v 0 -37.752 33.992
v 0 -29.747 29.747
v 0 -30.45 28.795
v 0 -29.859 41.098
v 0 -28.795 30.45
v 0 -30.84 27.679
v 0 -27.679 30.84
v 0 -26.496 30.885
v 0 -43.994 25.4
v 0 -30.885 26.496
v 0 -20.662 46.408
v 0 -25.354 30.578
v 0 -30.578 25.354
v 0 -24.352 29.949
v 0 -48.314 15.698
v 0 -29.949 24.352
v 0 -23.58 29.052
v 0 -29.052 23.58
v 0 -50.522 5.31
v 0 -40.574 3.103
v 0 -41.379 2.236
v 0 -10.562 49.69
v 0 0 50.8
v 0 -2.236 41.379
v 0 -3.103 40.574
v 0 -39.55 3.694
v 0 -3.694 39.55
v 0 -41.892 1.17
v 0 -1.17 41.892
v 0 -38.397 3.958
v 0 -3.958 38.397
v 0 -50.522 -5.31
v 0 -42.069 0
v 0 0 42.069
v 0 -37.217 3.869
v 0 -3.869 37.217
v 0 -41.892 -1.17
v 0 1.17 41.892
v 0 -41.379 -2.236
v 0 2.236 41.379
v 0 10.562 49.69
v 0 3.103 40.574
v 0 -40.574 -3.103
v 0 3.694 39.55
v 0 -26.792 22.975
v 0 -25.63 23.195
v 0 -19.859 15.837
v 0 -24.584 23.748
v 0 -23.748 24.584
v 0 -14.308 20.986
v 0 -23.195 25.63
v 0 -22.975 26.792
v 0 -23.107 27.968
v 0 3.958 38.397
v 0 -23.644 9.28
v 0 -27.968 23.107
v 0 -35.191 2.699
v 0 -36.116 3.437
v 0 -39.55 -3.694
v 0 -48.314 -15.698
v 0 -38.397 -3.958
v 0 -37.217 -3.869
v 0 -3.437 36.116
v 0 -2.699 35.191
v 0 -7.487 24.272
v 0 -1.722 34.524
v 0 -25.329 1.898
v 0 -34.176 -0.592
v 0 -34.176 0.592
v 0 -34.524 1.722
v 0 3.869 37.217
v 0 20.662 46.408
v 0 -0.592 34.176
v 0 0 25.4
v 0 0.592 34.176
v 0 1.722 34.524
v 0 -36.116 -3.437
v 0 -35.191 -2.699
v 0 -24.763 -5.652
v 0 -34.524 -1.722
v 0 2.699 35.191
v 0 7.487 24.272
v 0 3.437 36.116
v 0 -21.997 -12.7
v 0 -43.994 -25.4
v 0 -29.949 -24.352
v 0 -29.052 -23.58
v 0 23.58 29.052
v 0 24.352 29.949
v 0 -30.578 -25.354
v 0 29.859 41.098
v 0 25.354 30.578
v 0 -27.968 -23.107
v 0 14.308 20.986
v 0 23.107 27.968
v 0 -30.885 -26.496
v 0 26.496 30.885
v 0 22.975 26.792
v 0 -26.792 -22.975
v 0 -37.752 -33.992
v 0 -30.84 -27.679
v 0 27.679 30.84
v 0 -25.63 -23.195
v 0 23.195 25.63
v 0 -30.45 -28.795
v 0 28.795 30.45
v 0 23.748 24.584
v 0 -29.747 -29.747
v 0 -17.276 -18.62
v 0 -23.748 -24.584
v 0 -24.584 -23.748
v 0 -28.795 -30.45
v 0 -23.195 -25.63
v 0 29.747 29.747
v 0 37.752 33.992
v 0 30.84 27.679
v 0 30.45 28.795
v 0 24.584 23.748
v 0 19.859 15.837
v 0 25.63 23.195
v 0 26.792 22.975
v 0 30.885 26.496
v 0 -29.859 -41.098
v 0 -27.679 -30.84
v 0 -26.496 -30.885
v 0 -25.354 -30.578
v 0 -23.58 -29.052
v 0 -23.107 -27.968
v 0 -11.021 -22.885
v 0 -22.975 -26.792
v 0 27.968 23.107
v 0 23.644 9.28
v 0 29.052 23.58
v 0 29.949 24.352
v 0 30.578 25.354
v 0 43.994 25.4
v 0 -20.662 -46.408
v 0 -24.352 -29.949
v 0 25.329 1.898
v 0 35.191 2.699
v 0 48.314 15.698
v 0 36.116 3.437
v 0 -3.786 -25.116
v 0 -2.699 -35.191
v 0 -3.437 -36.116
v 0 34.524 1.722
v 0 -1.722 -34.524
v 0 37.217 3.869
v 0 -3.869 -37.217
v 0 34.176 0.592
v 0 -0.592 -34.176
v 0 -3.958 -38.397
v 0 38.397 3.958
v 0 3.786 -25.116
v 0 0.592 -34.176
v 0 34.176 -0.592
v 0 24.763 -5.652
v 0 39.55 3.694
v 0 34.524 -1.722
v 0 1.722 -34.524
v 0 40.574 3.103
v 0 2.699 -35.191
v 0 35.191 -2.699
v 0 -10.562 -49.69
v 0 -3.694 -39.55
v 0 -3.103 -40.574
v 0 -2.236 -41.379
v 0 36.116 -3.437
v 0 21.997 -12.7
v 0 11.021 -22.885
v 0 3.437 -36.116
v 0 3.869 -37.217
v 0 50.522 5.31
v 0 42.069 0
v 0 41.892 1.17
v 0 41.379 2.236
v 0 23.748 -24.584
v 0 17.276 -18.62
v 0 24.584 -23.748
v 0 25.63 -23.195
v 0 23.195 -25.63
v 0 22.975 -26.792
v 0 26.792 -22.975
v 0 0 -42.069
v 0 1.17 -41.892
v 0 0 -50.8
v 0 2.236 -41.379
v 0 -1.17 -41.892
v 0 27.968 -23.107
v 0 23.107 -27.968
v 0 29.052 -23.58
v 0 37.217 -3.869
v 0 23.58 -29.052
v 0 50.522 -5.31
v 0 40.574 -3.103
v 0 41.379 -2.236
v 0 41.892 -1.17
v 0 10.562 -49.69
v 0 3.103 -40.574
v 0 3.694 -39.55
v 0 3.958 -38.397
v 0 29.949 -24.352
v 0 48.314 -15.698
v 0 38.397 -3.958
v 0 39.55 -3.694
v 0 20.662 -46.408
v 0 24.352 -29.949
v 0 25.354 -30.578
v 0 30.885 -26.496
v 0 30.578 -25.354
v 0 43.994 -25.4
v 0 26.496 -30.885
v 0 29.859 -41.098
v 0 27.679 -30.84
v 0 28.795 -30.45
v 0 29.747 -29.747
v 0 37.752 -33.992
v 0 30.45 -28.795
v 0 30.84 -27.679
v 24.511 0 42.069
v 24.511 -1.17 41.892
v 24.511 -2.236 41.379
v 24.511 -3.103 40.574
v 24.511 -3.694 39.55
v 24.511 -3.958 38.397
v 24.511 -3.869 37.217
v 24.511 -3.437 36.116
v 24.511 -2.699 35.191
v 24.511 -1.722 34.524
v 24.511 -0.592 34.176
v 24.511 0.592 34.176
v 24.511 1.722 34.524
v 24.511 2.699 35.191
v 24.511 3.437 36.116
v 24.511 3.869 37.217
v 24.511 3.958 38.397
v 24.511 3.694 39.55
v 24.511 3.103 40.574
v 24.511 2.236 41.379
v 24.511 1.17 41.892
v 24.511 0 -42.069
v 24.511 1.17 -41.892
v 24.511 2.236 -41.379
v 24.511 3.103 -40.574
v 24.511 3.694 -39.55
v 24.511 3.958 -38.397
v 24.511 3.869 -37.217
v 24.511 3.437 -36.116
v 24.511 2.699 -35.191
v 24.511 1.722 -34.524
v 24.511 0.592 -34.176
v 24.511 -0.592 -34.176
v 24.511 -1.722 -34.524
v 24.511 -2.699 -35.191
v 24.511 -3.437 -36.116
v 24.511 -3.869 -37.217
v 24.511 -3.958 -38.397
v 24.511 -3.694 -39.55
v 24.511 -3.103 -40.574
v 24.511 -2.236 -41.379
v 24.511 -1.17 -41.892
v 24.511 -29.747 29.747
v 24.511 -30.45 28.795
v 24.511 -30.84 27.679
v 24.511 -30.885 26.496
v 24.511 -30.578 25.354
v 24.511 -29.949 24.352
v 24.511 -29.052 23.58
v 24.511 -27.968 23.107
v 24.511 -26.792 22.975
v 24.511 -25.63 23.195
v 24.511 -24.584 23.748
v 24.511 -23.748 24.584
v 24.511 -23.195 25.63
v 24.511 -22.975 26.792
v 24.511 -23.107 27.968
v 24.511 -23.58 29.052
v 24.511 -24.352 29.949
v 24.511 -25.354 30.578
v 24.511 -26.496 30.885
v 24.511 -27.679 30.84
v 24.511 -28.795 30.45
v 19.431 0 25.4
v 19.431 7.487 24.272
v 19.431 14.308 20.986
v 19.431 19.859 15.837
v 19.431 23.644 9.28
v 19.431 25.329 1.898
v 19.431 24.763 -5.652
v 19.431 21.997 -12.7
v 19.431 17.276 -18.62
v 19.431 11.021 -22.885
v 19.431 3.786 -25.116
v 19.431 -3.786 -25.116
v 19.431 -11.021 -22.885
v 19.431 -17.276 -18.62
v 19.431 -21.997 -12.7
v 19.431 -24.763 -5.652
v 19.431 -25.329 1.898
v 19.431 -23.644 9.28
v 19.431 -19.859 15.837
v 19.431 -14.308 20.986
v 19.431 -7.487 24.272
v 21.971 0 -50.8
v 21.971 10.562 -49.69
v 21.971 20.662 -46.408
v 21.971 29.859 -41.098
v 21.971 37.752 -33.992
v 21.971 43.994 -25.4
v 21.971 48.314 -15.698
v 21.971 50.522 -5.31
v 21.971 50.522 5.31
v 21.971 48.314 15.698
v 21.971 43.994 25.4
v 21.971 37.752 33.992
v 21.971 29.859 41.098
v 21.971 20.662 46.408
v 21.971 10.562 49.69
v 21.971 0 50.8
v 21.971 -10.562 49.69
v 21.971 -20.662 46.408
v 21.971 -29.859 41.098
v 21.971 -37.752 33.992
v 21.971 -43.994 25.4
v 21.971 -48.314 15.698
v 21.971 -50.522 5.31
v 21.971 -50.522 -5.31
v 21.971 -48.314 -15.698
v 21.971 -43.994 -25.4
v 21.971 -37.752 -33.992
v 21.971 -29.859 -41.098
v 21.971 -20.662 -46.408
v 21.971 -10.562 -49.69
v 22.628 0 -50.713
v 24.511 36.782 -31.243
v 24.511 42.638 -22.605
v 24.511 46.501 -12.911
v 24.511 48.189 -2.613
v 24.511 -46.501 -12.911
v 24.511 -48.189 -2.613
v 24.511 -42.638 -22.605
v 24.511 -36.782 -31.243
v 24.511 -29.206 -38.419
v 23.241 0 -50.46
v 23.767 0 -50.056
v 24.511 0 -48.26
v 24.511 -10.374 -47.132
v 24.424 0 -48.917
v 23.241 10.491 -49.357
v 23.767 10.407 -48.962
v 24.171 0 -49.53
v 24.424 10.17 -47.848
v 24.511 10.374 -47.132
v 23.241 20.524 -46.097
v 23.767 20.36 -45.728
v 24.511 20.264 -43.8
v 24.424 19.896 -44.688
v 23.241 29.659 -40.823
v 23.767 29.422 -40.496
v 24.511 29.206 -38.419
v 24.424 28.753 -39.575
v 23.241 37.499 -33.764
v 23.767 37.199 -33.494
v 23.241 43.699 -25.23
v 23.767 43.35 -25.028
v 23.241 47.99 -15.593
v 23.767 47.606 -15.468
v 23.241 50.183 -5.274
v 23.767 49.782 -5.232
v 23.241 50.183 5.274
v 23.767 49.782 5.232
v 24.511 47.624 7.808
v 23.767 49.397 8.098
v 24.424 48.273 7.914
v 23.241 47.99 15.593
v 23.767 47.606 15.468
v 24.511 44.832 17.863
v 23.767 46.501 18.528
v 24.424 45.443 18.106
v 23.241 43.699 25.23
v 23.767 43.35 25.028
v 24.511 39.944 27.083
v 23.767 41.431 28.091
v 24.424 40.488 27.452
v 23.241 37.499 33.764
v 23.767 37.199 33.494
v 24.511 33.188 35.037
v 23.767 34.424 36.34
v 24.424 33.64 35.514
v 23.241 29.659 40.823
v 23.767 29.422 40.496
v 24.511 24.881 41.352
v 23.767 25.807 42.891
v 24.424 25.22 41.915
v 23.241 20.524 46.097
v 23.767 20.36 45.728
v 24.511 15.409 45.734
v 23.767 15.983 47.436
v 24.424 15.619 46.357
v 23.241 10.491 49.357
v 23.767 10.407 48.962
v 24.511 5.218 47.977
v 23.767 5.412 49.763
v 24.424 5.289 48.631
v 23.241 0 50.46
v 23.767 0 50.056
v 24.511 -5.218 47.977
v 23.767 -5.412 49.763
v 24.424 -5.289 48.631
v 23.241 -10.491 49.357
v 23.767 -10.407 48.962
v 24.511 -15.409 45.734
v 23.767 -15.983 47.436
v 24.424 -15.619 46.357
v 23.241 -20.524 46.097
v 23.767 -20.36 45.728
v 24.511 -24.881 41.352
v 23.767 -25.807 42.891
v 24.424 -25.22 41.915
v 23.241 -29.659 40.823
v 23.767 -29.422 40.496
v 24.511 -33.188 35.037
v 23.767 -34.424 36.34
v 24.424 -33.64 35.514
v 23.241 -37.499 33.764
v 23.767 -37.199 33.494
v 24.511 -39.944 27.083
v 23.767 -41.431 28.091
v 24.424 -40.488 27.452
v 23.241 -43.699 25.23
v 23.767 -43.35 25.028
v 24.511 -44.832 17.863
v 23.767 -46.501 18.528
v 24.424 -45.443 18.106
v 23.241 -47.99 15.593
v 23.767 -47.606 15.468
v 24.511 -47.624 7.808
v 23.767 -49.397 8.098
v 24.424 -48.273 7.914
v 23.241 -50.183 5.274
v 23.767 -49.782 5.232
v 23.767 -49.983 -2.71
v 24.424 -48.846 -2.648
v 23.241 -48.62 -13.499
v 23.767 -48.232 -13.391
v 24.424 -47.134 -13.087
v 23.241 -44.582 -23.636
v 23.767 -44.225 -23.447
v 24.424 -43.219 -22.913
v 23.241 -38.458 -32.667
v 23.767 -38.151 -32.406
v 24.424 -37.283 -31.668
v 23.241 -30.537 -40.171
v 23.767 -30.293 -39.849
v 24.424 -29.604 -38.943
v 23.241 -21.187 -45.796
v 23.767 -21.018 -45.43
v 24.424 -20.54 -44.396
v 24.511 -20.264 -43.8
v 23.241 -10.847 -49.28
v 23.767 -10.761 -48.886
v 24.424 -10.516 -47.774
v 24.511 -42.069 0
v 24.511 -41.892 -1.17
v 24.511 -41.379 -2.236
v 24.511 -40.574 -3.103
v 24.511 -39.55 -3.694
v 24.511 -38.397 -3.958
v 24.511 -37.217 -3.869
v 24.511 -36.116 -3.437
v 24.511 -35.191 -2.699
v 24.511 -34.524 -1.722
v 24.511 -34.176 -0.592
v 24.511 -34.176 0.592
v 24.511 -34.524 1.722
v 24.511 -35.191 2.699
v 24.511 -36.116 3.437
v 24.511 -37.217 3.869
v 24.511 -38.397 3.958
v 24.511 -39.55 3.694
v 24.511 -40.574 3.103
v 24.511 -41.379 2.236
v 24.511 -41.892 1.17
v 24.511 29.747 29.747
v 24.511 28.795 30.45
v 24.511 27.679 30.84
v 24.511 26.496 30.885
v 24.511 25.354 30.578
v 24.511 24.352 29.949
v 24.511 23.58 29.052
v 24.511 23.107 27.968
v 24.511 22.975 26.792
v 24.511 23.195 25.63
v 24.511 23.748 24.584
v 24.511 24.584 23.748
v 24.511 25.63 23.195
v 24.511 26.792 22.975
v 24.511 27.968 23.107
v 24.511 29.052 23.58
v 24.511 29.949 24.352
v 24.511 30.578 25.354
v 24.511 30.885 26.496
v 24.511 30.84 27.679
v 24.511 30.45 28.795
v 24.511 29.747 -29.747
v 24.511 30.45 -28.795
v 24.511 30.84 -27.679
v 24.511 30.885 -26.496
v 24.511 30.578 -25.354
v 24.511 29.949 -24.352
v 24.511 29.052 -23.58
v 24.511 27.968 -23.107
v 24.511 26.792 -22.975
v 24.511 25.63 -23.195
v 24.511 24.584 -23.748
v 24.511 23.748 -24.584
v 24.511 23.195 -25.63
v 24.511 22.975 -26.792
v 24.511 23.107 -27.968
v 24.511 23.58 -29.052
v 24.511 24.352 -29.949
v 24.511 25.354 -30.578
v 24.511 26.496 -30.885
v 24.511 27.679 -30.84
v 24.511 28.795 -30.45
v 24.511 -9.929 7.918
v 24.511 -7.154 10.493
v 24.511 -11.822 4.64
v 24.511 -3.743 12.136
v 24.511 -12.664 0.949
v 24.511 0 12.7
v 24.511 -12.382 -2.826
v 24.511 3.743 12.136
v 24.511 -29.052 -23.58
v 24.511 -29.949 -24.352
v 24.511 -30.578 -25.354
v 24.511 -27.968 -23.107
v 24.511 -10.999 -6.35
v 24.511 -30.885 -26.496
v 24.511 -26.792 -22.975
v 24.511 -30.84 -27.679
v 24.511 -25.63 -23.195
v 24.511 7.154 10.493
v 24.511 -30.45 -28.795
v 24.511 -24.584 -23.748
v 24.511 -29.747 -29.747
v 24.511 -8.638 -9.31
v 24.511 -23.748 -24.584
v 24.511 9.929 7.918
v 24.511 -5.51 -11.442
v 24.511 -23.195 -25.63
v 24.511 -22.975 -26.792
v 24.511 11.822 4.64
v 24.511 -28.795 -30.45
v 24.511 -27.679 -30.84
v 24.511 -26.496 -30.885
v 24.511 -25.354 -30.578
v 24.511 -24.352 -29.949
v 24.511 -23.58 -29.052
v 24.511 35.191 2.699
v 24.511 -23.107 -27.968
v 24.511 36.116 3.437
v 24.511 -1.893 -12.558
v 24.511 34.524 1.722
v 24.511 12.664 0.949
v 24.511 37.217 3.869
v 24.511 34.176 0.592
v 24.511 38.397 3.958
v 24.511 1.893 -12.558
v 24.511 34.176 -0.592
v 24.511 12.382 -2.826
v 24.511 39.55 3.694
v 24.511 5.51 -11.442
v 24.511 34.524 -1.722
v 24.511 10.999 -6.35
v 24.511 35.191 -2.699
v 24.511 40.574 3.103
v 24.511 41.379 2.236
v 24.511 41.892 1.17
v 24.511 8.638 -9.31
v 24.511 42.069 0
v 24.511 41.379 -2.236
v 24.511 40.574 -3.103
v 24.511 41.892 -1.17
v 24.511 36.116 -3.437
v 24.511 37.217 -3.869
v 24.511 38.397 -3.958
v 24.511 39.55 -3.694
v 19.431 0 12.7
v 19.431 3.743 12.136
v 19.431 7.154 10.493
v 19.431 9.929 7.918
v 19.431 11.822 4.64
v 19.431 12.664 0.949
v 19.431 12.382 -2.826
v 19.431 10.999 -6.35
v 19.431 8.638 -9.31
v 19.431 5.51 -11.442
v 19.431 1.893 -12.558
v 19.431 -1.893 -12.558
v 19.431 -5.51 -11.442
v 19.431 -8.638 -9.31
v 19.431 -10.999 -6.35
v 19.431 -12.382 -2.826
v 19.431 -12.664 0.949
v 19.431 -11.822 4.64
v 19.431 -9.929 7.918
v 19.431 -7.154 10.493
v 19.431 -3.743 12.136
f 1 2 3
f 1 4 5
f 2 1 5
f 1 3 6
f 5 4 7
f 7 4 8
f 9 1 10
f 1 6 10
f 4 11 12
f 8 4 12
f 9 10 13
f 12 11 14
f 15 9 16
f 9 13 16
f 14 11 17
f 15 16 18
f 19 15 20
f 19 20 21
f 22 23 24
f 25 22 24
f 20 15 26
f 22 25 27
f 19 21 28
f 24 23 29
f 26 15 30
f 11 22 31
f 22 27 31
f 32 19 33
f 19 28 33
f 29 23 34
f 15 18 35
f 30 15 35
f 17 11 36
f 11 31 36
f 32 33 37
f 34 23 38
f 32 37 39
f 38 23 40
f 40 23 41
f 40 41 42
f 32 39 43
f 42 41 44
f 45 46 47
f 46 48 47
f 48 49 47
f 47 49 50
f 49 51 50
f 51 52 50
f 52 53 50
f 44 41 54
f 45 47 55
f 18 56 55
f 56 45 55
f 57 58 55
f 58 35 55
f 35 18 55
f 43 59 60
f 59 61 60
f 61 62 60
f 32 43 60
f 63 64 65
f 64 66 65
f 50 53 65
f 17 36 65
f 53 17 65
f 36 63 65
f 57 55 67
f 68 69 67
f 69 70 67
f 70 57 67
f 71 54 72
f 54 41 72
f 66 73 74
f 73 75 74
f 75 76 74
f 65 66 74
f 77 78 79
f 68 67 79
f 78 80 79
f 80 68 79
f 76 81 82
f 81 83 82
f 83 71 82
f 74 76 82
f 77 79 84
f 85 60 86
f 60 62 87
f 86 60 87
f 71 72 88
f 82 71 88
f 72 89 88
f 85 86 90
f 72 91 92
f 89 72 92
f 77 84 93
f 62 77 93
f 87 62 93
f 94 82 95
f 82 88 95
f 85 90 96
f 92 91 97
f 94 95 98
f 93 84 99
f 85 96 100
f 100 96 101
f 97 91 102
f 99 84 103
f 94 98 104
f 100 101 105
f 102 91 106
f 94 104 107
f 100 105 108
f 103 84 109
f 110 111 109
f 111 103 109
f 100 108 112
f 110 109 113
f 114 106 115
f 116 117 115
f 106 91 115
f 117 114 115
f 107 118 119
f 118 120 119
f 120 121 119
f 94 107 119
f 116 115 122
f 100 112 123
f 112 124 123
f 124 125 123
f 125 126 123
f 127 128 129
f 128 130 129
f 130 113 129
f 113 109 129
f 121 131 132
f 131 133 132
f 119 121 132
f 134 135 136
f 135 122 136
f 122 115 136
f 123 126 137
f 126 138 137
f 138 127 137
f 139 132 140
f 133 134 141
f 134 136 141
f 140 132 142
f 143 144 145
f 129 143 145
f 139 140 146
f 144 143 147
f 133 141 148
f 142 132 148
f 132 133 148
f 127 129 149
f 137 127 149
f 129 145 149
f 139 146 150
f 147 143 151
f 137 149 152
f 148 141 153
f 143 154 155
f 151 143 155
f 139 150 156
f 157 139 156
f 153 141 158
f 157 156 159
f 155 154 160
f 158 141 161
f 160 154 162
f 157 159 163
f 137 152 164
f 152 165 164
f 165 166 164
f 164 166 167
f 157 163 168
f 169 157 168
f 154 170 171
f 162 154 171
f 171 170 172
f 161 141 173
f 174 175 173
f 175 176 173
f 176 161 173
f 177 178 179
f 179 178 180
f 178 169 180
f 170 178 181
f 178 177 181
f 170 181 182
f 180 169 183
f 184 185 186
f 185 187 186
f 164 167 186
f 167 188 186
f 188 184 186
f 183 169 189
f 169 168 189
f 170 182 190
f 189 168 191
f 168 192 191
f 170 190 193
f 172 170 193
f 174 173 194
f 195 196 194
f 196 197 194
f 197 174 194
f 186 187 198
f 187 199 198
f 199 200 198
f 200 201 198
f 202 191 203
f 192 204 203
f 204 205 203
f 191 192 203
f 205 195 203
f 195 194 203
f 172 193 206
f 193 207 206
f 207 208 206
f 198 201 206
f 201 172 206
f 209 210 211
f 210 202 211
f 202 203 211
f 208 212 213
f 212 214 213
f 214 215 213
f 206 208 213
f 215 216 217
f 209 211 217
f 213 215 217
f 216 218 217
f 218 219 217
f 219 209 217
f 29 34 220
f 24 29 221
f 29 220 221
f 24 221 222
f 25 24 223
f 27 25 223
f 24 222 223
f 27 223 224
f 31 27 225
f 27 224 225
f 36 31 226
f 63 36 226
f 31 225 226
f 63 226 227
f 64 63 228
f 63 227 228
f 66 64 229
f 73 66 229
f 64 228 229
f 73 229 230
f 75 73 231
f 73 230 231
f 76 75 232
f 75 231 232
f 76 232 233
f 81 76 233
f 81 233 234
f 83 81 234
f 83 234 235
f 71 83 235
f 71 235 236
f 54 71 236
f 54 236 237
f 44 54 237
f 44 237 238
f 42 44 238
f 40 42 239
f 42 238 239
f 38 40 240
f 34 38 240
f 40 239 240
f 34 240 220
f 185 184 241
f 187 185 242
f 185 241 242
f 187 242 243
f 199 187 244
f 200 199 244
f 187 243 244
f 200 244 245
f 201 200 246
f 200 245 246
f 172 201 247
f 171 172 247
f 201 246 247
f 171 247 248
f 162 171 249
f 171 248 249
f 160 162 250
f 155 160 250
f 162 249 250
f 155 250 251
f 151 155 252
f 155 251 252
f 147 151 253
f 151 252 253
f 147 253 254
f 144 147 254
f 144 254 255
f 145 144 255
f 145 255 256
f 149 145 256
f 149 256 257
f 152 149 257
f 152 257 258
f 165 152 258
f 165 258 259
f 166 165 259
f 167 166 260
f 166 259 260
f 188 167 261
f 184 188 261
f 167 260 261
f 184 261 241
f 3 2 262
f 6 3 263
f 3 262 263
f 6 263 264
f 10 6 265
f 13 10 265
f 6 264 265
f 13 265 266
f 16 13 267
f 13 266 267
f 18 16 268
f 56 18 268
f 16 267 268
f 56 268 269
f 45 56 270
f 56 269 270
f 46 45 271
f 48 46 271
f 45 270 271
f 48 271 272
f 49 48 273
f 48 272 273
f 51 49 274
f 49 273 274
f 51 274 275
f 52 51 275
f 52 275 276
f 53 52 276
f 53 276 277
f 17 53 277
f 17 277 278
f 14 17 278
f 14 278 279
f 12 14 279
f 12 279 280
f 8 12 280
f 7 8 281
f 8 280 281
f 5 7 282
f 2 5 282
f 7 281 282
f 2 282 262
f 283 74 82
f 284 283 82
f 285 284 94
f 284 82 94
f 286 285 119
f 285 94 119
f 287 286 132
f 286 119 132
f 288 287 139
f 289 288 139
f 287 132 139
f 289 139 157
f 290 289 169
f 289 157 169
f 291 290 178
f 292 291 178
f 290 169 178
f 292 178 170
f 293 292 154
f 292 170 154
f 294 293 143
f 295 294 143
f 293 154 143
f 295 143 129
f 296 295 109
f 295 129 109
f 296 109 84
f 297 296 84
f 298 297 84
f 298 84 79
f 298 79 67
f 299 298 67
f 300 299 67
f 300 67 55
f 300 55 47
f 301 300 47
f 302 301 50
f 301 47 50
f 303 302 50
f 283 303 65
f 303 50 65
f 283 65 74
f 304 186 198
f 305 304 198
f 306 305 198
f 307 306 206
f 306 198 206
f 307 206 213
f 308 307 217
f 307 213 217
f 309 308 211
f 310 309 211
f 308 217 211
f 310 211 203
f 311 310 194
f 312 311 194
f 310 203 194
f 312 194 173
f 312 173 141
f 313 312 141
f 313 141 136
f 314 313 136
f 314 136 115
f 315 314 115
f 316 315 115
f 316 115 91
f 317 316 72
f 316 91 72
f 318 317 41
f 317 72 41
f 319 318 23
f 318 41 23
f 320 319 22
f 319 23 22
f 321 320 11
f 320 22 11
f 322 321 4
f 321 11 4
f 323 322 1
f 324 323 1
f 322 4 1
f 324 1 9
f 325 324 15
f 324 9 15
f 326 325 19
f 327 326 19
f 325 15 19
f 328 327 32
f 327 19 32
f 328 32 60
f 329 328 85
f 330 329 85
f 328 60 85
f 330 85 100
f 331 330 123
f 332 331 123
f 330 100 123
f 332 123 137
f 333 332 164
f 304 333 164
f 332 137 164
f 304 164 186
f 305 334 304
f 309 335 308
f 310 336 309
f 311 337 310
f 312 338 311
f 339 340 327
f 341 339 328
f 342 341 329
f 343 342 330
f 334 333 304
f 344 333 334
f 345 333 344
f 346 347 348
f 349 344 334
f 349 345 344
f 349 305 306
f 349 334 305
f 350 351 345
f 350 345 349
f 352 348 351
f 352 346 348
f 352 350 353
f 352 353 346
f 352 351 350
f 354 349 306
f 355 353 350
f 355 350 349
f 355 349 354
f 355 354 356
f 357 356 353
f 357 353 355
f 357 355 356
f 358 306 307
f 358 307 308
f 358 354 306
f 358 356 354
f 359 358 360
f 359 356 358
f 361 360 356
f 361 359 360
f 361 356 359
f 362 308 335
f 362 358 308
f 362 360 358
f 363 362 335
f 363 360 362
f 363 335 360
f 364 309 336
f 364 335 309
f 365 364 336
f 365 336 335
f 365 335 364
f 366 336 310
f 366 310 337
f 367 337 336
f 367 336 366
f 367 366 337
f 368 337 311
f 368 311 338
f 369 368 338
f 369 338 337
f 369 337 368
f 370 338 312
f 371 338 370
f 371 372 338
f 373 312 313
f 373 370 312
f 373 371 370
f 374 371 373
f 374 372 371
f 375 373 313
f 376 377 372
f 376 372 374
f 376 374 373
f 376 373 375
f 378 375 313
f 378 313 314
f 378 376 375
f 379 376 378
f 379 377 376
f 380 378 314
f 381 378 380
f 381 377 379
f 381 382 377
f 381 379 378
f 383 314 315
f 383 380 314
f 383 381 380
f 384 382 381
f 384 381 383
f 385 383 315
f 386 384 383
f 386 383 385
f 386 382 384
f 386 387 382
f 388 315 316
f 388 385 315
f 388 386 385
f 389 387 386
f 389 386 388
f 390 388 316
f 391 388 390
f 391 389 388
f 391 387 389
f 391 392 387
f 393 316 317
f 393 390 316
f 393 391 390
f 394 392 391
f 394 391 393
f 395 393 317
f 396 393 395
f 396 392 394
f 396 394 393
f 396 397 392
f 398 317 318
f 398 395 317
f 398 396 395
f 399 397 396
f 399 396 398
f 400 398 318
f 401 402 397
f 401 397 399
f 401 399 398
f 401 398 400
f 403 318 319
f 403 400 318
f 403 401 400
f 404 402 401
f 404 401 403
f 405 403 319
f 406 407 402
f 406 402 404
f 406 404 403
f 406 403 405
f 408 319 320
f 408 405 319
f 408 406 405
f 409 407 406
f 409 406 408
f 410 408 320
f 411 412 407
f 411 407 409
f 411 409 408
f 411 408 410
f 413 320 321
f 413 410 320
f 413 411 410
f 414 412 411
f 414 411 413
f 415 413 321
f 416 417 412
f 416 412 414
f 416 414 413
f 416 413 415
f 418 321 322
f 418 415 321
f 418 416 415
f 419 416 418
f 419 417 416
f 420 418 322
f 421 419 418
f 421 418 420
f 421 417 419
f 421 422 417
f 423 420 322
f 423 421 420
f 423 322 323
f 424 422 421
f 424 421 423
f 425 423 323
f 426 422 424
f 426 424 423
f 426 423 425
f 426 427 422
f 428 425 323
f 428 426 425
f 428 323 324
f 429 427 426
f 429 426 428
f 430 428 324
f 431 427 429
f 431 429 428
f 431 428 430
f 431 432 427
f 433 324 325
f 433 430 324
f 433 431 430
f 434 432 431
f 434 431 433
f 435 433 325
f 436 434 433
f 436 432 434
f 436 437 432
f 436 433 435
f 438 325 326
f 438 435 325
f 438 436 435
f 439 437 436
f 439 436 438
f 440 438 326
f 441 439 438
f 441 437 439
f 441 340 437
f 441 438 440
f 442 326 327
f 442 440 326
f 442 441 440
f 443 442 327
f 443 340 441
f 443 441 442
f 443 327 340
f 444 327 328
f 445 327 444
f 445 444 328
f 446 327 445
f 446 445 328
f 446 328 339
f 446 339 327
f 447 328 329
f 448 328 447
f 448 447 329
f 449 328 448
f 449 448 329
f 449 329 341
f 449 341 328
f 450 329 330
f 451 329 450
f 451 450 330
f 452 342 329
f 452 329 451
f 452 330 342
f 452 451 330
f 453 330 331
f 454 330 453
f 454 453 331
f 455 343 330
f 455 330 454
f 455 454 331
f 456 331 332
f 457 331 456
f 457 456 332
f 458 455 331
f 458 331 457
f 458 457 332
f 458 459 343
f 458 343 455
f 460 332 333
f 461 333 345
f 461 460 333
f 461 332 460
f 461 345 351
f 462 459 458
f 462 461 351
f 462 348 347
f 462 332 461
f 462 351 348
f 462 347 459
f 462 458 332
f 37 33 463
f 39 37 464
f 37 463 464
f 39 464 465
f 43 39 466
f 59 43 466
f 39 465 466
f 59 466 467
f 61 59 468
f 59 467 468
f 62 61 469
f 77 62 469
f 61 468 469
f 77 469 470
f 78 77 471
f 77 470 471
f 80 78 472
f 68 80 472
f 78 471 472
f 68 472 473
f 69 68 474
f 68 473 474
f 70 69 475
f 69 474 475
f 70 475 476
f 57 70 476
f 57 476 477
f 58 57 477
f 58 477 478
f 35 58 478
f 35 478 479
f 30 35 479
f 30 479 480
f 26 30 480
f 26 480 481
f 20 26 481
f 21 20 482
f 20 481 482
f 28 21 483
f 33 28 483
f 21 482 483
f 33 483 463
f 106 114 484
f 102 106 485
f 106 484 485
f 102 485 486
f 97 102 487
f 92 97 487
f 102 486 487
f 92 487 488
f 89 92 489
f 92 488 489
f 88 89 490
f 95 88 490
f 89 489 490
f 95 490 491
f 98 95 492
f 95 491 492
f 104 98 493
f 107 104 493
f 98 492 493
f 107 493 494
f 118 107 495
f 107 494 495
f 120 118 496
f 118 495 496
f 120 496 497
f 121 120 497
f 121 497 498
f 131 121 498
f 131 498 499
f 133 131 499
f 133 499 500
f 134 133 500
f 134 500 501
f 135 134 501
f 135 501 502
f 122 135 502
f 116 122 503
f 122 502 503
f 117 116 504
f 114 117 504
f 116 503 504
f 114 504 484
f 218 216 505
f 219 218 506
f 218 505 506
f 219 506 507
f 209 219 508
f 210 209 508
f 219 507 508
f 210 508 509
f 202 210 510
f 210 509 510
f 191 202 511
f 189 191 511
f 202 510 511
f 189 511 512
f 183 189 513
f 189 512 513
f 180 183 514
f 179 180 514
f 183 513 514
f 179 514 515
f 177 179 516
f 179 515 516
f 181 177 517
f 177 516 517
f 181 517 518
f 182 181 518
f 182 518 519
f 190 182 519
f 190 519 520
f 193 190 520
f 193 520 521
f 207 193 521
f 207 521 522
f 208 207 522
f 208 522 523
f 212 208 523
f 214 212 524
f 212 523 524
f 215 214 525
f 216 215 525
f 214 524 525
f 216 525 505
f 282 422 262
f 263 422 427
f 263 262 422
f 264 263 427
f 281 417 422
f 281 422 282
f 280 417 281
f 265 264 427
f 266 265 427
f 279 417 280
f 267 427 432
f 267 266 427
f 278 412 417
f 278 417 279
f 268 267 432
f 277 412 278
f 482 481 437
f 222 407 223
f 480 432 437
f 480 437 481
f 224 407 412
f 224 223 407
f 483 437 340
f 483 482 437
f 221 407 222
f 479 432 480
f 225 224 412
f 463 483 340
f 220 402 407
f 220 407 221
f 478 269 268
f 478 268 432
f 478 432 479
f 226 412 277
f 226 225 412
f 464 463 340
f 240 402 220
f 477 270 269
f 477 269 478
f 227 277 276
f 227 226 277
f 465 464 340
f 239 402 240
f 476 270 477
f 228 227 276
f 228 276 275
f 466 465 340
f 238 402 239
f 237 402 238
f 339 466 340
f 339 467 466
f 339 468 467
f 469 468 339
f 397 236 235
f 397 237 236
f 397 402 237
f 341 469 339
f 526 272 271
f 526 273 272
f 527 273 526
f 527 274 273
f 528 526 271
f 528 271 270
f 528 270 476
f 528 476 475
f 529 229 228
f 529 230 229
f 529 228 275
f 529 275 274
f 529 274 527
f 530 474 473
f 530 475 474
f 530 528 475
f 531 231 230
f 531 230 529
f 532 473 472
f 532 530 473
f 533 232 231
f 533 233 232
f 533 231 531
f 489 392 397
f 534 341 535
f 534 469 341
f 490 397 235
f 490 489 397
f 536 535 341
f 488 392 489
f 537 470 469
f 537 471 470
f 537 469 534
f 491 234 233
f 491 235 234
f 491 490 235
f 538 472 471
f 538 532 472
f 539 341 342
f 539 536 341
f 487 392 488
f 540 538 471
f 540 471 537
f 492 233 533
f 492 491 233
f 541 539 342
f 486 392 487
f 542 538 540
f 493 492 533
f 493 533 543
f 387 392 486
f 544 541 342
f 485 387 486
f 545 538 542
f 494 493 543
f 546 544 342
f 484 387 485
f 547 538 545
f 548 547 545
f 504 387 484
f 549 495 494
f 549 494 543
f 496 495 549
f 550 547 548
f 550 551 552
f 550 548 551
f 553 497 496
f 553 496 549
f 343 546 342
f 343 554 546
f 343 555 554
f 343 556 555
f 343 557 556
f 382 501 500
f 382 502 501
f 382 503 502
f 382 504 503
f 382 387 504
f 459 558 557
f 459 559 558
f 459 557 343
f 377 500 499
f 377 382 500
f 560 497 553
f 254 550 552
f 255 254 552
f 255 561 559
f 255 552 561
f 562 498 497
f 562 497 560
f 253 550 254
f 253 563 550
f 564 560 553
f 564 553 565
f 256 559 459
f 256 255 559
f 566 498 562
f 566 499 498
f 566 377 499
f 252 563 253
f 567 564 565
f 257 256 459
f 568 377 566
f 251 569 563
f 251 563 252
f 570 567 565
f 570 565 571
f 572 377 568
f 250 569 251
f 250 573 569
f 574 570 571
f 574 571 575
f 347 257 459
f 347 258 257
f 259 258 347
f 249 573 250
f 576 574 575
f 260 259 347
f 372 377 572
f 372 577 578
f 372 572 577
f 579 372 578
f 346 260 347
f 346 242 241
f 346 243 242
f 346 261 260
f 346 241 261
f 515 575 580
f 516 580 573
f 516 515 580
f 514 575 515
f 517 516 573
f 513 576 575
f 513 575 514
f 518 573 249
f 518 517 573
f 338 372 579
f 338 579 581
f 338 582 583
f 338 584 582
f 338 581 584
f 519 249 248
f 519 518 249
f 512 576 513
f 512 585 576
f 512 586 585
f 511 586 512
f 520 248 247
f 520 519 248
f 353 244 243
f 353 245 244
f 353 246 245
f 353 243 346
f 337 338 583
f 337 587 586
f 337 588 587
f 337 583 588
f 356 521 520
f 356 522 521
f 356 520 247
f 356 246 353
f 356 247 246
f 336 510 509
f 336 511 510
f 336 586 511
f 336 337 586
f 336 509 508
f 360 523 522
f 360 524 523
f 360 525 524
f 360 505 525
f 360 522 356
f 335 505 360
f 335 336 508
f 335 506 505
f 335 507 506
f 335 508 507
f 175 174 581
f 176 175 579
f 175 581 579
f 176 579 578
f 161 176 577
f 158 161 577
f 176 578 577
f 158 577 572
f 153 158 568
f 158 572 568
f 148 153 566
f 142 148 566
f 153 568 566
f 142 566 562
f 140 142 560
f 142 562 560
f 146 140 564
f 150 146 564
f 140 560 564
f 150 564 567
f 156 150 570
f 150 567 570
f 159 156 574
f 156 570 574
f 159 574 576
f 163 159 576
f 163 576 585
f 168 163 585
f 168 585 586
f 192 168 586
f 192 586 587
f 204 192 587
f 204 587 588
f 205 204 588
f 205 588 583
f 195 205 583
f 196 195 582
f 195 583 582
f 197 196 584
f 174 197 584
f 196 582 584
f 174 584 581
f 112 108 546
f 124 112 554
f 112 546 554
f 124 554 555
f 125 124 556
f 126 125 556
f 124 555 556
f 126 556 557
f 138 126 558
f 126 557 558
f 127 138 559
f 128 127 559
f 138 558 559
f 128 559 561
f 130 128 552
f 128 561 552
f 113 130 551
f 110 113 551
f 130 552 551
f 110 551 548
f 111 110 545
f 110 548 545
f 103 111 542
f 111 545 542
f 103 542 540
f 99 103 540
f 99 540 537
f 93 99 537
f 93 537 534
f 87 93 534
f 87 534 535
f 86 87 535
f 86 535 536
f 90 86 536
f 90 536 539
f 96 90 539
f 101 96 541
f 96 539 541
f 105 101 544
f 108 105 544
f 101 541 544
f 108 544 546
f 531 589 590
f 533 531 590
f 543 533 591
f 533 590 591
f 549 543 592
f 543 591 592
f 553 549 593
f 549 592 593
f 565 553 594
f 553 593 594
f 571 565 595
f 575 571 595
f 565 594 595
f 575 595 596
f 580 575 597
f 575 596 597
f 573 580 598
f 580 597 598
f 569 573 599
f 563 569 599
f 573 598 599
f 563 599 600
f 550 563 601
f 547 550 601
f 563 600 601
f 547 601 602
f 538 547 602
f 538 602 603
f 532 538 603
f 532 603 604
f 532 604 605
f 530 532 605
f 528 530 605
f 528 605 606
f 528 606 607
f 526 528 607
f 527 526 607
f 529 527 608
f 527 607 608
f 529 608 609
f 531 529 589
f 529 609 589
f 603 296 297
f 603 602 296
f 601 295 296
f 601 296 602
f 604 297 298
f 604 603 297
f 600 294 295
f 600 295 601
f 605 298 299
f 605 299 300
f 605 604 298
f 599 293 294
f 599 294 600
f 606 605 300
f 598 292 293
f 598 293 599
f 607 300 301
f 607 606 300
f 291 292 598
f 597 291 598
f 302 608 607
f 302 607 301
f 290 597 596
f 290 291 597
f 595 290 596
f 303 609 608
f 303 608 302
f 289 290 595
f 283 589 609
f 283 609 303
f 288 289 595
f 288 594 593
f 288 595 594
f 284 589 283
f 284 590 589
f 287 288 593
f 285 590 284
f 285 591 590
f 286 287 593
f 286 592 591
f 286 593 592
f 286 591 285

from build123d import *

# Parameters (mm, degrees)
SKETCH1_R           = 50.8
BOSS_EXTRUDE1_DEPTH = 24.511
FILLET1_R           = 2.54
SKETCH3_R           = 3.96875
CUT_EXTRUDE2_DEPTH  = 24.511
CIRPATTERN1_COUNT   = 8
SKETCH6_R           = 25.4
CUT_EXTRUDE5_DEPTH  = 19.431
SKETCH7_R           = 12.7
CUT_EXTRUDE6_DEPTH  = 5.08


with BuildPart() as part:
    # Sketch1 → Boss-Extrude1 (new body)
    with BuildSketch(Plane(origin=(0, 0, 0), x_dir=(0, 0, -1), z_dir=(1, 0, 0))):
        Circle(SKETCH1_R)
    extrude(amount=BOSS_EXTRUDE1_DEPTH)

    # Fillet1
    fillet1_edges = [part.edges().sort_by_distance(p)[0] for p in [
        (24.511, 0, 50.8),
    ]]
    fillet(fillet1_edges, radius=FILLET1_R)

    # Sketch3 → Cut-Extrude2 (cut)
    with BuildSketch(Plane(origin=(24.511, 0, 0), x_dir=(0, 0, -1), z_dir=(1, 0, 0))):
        with Locations((38.1, 0)):
            Circle(SKETCH3_R)
    cut_extrude2 = extrude(amount=-CUT_EXTRUDE2_DEPTH, mode=Mode.SUBTRACT)

    # CirPattern1: Cut-Extrude2 ×8 about axis
    cirpattern1_axis = Axis((0, 0, 0), (1, 0, 0))
    for i in range(1, CIRPATTERN1_COUNT):
        add(cut_extrude2.rotate(cirpattern1_axis, i * 360 / CIRPATTERN1_COUNT), mode=Mode.SUBTRACT)

    # Sketch6 → Cut-Extrude5 (cut)
    with BuildSketch(Plane.ZY):
        Circle(SKETCH6_R)
    extrude(amount=-CUT_EXTRUDE5_DEPTH, mode=Mode.SUBTRACT)

    # Sketch7 → Cut-Extrude6 (cut)
    with BuildSketch(Plane.ZY.offset(-19.431)):
        Circle(SKETCH7_R)
    extrude(amount=-CUT_EXTRUDE6_DEPTH, mode=Mode.SUBTRACT)


solid = part.part
